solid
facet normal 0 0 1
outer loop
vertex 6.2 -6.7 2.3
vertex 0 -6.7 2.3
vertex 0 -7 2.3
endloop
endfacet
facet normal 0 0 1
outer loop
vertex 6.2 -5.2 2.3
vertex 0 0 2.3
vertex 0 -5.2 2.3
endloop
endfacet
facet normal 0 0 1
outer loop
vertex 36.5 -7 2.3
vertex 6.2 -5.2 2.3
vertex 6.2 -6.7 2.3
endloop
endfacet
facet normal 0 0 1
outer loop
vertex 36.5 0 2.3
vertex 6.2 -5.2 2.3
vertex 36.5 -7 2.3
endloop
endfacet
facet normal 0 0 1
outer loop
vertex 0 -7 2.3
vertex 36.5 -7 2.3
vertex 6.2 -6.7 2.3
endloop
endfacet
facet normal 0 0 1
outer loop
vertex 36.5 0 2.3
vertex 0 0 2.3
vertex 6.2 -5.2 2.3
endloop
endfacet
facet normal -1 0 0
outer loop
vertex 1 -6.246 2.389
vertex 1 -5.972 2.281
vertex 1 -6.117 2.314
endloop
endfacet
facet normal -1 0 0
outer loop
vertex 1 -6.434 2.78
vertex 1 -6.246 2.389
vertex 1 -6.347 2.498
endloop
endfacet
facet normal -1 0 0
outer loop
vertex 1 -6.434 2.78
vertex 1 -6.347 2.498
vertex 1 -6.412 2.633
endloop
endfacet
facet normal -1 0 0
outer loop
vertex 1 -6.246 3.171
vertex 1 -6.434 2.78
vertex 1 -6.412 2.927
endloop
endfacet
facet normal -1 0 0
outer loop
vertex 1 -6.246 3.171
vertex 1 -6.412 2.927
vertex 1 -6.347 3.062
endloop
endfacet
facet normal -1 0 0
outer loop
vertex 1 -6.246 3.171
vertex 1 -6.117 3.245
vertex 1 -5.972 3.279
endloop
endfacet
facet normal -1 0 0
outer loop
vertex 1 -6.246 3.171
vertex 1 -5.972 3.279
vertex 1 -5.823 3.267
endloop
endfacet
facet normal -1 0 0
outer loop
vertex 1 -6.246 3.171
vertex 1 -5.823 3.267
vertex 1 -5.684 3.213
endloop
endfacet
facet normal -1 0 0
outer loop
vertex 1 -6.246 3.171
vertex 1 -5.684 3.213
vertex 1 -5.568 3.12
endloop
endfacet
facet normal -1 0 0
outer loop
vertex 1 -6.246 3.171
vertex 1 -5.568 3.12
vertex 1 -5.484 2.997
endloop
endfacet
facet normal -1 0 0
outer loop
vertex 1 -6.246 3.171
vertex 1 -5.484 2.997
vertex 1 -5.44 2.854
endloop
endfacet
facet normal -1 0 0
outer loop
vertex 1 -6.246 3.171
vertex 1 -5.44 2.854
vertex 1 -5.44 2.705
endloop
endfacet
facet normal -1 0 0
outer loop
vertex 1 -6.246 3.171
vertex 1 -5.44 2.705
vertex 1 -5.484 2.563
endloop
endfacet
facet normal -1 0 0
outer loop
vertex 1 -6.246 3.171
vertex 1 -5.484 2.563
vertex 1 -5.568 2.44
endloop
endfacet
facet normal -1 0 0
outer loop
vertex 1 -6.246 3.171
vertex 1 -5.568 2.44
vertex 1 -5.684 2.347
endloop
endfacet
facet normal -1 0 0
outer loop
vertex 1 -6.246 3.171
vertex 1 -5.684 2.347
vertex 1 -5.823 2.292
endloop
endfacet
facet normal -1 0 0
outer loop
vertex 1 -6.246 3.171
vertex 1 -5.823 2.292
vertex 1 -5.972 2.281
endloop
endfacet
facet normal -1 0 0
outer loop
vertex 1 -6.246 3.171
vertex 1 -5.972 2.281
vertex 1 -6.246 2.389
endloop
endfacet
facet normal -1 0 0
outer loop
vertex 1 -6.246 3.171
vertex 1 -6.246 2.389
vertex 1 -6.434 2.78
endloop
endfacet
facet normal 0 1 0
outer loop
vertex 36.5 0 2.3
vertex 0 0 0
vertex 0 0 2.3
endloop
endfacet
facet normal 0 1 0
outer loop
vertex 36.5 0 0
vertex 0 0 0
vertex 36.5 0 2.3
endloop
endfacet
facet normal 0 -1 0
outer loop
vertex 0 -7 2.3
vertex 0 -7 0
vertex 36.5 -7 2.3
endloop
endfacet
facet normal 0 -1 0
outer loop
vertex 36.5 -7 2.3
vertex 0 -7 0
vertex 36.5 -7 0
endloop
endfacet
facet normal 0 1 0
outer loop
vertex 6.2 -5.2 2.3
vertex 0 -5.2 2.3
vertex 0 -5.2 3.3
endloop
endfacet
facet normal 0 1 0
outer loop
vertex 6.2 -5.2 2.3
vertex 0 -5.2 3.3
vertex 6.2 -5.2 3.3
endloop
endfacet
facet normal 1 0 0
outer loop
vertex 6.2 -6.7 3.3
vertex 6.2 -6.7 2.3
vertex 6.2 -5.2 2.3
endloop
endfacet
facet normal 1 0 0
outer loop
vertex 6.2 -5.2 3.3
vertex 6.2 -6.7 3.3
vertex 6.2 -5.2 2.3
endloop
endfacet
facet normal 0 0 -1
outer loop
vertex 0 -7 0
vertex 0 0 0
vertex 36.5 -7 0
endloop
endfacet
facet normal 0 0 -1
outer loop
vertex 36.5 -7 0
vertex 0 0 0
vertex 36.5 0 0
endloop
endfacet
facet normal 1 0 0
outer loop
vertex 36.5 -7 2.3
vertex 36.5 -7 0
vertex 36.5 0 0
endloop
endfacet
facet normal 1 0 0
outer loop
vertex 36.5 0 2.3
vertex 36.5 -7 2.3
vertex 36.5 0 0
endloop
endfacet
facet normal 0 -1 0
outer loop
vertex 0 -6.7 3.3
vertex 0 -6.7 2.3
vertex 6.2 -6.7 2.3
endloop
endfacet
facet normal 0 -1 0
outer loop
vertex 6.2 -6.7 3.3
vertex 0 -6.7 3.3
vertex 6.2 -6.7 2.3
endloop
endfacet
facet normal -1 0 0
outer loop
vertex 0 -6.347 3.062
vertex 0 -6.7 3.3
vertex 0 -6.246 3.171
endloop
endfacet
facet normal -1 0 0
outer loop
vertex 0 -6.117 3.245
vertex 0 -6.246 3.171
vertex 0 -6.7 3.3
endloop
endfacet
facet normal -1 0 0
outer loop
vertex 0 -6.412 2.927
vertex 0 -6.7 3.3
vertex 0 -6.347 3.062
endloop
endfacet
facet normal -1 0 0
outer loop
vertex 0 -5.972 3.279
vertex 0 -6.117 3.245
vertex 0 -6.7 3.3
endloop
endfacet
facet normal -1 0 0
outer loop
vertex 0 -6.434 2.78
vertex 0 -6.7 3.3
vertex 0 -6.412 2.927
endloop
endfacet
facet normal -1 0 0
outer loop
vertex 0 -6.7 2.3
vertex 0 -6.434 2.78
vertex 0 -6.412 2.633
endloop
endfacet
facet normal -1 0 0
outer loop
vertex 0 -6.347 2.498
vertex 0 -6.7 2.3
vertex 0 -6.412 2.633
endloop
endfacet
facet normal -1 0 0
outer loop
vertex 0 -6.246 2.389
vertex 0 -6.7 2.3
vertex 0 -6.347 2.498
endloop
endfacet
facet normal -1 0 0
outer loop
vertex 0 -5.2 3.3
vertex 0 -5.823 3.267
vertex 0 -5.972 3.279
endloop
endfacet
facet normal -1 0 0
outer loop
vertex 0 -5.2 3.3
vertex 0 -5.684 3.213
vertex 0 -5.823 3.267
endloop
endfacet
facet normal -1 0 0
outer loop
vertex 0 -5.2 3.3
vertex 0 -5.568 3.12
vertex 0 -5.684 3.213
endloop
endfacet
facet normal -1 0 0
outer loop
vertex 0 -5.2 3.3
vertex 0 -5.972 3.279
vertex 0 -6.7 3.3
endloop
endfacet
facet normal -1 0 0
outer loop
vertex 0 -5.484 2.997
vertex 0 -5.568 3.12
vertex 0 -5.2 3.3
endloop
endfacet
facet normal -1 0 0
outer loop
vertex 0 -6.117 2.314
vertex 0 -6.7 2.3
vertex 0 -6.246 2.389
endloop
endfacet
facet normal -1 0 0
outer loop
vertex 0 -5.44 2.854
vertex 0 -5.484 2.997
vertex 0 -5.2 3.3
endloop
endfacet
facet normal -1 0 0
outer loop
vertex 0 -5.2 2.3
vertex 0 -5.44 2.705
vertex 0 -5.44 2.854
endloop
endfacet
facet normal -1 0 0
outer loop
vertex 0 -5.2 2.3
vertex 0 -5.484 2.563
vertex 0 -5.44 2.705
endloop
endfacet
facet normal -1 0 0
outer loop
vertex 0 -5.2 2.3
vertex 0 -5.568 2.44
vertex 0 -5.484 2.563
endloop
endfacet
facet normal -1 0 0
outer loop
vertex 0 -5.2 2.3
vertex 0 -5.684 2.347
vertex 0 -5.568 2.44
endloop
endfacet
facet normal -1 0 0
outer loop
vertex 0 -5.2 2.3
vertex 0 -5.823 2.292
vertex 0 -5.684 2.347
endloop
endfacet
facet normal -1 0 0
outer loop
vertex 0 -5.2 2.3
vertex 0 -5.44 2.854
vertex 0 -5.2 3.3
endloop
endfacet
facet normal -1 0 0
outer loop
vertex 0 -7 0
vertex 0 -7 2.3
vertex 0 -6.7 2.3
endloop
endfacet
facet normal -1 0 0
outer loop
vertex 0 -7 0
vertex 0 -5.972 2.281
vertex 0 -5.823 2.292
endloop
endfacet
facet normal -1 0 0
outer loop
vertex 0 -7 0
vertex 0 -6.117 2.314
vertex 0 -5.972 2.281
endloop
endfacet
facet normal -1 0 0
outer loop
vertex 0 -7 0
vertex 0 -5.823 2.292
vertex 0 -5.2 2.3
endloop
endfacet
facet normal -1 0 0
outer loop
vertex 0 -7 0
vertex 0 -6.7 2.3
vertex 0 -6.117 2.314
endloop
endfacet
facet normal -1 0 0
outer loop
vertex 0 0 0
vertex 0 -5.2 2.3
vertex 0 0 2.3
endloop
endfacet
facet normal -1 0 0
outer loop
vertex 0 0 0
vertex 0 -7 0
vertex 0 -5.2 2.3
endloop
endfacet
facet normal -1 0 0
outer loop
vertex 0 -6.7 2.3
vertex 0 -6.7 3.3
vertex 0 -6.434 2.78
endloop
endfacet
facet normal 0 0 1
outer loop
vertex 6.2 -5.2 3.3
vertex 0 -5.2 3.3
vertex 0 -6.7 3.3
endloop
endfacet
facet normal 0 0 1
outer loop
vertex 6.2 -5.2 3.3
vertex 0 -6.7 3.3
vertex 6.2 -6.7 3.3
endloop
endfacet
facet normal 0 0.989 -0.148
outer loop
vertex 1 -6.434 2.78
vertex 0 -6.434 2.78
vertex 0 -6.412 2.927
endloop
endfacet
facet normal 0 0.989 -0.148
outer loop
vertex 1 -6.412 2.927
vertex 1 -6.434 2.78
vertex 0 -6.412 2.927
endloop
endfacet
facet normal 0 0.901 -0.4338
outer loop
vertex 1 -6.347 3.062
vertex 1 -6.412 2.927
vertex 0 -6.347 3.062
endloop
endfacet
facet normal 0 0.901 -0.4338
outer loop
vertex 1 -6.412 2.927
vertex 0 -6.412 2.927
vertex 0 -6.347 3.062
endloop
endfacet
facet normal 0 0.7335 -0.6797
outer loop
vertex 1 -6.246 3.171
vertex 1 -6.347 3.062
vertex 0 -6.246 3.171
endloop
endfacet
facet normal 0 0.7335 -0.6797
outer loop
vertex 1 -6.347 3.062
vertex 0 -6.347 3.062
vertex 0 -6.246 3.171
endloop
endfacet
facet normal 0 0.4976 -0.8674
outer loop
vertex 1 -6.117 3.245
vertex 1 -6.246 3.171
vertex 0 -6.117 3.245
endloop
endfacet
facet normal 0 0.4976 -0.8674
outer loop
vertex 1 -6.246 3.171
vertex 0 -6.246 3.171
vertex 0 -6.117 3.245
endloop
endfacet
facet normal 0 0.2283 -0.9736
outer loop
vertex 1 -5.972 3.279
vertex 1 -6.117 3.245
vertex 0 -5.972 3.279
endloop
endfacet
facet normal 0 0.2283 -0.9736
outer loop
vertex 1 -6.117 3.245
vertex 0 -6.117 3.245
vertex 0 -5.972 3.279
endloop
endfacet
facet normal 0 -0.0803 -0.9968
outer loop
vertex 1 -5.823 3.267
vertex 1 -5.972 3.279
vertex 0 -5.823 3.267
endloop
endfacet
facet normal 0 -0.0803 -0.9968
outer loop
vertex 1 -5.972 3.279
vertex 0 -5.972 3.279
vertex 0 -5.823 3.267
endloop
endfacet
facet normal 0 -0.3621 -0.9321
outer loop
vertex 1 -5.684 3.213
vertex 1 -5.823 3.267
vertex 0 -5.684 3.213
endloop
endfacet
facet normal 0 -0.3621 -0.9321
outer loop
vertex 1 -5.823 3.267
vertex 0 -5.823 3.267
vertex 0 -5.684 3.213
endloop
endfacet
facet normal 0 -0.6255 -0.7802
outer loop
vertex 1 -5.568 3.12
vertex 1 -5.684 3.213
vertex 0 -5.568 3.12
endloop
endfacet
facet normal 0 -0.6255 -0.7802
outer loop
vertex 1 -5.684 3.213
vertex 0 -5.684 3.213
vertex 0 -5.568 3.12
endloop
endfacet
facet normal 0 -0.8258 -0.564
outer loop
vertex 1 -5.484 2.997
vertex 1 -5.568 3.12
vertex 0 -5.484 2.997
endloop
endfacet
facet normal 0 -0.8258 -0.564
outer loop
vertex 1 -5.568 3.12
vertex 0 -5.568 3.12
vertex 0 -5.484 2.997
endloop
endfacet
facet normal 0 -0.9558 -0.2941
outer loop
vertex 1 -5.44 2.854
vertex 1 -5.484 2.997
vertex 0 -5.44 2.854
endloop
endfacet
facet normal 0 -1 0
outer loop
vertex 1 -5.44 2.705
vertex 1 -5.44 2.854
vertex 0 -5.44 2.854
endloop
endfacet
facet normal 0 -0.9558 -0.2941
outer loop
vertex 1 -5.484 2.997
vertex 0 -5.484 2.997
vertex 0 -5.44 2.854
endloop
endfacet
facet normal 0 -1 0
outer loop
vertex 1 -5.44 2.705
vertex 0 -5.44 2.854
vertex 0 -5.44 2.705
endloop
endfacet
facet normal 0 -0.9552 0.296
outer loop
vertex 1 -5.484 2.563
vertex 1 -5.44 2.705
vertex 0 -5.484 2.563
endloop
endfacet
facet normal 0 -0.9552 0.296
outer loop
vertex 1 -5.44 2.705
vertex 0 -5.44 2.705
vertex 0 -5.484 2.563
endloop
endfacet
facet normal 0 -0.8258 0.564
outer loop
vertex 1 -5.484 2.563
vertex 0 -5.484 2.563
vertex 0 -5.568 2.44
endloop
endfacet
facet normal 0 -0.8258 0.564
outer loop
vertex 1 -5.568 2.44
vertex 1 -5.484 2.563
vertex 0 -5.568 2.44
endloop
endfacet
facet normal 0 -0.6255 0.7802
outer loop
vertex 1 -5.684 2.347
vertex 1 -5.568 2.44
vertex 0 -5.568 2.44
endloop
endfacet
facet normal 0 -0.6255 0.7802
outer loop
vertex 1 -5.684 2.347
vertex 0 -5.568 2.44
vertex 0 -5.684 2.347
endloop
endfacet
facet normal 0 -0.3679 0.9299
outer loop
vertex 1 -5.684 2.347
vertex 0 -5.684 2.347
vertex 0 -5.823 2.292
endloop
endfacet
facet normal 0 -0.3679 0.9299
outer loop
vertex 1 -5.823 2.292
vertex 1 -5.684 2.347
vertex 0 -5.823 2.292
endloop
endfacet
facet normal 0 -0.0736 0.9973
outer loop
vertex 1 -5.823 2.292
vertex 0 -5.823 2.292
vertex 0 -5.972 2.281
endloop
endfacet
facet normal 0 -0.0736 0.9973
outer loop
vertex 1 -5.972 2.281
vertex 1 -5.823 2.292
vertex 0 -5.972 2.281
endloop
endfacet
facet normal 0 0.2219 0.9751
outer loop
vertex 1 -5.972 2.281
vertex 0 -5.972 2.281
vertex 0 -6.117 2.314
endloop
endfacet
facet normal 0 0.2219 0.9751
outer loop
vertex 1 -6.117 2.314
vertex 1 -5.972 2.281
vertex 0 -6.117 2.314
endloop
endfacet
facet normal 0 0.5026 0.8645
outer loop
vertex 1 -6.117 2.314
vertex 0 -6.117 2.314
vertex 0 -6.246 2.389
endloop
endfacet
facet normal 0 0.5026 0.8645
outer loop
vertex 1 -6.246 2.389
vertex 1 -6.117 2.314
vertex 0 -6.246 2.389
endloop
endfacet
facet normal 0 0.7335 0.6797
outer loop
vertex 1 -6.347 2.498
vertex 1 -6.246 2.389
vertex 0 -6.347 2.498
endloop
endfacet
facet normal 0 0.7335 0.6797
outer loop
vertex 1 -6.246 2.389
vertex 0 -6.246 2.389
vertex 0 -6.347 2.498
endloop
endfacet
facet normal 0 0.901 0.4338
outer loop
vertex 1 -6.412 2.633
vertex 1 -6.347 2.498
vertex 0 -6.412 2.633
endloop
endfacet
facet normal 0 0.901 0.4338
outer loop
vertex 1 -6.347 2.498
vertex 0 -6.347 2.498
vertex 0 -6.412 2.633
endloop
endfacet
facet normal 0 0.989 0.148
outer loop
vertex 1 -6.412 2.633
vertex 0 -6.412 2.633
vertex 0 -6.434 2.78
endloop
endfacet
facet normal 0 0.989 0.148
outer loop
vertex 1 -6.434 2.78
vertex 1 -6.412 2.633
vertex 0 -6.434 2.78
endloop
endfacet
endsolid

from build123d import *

# Parameters (mm, degrees)
SKETCH1_W           = 36.5
SKETCH1_H           = 7
BOSS_EXTRUDE1_DEPTH = 2.3
SKETCH2_W           = 6.2
SKETCH2_H           = 1.5
BOSS_EXTRUDE2_DEPTH = 1
SKETCH3_R           = 0.5
CUT_EXTRUDE1_DEPTH  = 1


with BuildPart() as part:
    # Sketch1 → Boss-Extrude1 (new body)
    with BuildSketch(Plane.XY):
        with Locations((18.25, -3.5)):
            Rectangle(SKETCH1_W, SKETCH1_H)
    extrude(amount=BOSS_EXTRUDE1_DEPTH)

    # Sketch2 → Boss-Extrude2 (add)
    with BuildSketch(Plane.XY.offset(2.3)):
        with Locations((3.1, -5.95)):
            Rectangle(SKETCH2_W, SKETCH2_H)
    extrude(amount=BOSS_EXTRUDE2_DEPTH)

    # Sketch3 → Cut-Extrude1 (cut)
    with BuildSketch(Plane.ZY):
        with Locations(Location((2.779912682, -5.934327953, 0), (0, 0, 270))):
            Circle(SKETCH3_R)
    extrude(amount=-CUT_EXTRUDE1_DEPTH, mode=Mode.SUBTRACT)


solid = part.part
